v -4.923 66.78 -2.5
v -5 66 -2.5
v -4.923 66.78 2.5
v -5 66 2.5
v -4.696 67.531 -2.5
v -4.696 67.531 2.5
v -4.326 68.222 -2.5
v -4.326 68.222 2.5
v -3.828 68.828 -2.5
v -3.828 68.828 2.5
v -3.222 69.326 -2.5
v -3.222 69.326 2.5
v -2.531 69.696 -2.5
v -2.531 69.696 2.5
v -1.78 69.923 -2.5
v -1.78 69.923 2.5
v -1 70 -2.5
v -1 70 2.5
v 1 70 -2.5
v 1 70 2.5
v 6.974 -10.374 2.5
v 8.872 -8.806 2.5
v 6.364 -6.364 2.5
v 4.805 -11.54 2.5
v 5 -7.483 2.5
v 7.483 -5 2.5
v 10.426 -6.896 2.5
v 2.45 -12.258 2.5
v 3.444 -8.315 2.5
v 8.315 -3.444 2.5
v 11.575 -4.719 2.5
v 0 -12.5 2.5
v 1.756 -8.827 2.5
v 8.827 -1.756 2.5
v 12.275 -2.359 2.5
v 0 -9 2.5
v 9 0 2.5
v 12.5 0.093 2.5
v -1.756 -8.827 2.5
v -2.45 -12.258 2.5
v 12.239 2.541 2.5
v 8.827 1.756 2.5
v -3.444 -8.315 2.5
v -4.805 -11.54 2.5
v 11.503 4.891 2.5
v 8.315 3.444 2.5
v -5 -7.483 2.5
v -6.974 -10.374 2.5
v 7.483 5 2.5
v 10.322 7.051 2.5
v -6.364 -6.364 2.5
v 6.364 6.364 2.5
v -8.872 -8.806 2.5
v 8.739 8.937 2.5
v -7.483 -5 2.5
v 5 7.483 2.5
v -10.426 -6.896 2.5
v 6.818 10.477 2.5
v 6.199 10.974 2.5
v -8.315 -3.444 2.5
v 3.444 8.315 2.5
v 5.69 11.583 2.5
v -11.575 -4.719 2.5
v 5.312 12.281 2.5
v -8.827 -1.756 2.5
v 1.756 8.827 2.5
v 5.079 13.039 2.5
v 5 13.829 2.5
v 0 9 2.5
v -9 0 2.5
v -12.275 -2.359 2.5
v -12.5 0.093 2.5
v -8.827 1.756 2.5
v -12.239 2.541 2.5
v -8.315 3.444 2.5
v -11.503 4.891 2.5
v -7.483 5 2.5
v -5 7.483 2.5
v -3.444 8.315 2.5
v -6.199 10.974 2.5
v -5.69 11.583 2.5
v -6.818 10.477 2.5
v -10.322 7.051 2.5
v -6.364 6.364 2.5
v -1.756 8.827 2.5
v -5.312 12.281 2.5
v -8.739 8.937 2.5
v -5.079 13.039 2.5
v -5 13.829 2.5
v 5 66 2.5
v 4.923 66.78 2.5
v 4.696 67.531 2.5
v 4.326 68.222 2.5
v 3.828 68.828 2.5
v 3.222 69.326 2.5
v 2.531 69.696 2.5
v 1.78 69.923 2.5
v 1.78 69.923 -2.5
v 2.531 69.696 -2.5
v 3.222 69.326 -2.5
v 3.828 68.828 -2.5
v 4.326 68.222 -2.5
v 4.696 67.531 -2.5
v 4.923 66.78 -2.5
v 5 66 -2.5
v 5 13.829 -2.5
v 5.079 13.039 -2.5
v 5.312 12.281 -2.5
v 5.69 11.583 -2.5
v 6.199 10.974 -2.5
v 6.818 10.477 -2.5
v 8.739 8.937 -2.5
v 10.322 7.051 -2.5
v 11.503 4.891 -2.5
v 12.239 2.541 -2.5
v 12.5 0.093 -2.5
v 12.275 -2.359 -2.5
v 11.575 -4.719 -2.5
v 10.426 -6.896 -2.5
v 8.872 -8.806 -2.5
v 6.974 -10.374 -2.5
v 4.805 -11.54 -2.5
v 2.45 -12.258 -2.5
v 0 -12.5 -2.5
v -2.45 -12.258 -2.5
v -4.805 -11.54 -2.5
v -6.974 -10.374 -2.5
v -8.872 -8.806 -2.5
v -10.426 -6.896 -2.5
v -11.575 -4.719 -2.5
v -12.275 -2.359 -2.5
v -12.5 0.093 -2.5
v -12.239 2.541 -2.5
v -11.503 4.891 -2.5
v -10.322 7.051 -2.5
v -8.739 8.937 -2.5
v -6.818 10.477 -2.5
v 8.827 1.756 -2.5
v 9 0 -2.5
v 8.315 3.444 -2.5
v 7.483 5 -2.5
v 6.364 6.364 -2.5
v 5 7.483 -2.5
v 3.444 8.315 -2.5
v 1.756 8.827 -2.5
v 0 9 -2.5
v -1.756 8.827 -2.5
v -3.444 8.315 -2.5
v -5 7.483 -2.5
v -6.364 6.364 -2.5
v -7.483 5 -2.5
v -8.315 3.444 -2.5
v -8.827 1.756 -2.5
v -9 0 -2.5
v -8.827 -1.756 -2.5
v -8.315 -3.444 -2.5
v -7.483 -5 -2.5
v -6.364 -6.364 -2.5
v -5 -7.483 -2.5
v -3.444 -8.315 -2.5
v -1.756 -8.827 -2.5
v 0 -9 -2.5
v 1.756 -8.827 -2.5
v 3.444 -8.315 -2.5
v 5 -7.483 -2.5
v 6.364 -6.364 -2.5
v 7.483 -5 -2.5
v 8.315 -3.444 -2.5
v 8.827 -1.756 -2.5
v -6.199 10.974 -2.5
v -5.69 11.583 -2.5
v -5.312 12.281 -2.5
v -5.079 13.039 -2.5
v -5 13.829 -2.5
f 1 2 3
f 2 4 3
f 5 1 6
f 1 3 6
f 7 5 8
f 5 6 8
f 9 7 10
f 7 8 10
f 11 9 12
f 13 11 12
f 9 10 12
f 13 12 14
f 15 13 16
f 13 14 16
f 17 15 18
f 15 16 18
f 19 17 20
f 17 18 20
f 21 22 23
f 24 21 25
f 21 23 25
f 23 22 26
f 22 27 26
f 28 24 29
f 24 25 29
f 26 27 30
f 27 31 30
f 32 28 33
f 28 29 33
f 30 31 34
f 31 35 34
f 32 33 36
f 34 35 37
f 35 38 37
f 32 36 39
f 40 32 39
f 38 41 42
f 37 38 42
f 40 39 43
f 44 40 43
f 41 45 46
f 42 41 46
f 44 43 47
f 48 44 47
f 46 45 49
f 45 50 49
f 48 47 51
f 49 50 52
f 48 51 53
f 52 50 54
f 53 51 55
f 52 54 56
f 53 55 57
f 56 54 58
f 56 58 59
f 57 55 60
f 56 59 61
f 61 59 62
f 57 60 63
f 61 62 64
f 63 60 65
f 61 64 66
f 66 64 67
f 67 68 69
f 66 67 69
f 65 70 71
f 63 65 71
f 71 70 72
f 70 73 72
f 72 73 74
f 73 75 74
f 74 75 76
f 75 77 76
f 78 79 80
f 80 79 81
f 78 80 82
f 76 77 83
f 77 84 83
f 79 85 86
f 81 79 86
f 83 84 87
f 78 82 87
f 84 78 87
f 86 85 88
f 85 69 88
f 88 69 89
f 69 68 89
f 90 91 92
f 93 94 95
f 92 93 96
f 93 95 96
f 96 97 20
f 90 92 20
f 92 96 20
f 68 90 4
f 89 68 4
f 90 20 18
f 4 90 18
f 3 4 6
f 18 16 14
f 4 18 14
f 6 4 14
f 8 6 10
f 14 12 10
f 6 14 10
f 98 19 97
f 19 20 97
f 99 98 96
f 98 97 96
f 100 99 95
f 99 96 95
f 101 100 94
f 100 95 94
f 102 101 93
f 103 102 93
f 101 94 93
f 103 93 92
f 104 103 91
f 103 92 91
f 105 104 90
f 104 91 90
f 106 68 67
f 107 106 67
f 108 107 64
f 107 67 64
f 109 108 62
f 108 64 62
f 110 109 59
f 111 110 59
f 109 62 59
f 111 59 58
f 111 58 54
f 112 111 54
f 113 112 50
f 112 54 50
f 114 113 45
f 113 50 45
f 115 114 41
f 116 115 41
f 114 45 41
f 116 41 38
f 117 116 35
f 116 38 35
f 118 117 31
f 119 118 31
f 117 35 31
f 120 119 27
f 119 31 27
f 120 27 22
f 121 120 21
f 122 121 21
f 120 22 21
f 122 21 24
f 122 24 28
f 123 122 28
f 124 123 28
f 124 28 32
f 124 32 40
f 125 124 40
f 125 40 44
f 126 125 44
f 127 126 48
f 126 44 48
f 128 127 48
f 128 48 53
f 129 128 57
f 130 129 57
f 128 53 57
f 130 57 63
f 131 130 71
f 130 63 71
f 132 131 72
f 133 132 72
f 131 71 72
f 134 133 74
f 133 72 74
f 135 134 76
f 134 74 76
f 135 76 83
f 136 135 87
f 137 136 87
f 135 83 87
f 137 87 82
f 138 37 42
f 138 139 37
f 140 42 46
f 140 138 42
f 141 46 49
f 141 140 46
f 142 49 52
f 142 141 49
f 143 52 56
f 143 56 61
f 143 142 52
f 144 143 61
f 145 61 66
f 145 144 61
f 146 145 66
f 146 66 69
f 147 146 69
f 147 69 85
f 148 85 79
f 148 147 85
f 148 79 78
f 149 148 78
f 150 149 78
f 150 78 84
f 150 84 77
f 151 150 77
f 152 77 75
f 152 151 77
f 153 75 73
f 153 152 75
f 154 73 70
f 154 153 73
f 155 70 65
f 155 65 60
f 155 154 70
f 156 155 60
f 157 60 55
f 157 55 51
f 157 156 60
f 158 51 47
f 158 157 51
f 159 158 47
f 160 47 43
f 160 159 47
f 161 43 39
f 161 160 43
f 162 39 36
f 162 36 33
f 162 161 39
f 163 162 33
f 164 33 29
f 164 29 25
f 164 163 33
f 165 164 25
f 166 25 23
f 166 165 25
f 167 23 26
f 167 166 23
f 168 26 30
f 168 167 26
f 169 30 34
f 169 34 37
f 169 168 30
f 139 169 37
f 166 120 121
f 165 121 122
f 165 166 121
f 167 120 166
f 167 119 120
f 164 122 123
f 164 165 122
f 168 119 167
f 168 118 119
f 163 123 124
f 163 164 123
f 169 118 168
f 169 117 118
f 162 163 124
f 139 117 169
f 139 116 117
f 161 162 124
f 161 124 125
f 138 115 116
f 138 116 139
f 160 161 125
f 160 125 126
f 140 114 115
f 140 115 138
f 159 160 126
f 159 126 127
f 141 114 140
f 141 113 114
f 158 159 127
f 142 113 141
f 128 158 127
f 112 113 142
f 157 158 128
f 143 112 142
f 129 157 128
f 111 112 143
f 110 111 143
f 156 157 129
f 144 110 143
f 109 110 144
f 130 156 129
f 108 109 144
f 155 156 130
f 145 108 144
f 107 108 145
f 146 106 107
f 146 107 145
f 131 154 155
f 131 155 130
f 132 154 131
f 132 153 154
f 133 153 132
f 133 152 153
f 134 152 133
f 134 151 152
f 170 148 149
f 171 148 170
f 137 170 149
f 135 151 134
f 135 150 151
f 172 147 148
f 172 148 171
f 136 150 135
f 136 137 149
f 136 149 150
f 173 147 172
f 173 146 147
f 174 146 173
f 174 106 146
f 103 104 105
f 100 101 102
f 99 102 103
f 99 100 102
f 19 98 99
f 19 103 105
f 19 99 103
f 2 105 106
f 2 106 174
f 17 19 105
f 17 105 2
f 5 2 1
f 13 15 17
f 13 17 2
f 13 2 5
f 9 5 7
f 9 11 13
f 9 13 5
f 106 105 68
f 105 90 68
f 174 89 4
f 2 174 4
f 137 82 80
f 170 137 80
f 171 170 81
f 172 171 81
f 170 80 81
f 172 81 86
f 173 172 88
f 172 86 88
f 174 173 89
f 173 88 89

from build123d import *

# Parameters (mm, degrees)
SKETCH1_R           = 9
BOSS_EXTRUDE1_DEPTH = 2.5


with BuildPart() as part:
    # Sketch1 → Boss-Extrude1 (new, symmetric)
    with BuildSketch(Plane.XY):
        with BuildLine():
            Line((-5, 13.829316686), (-5, 66))
            ThreePointArc((-5, 66), (-3.828427125, 68.828427125), (-1, 70))
            Line((-1, 70), (1, 70))
            ThreePointArc((1, 70), (3.828427125, 68.828427125), (5, 66))
            Line((5, 66), (5, 13.829316686))
            ThreePointArc((5, 13.829316686), (5.483803708, 11.922391507), (6.818181818, 10.476755065))
            ThreePointArc((6.818181818, 10.476755065), (0, -12.5), (-6.818181818, 10.476755065))
            ThreePointArc((-6.818181818, 10.476755065), (-5.483803708, 11.922391507), (-5, 13.829316686))
        make_face()
        Circle(SKETCH1_R, mode=Mode.SUBTRACT)
    extrude(amount=BOSS_EXTRUDE1_DEPTH, both=True)


solid = part.part
